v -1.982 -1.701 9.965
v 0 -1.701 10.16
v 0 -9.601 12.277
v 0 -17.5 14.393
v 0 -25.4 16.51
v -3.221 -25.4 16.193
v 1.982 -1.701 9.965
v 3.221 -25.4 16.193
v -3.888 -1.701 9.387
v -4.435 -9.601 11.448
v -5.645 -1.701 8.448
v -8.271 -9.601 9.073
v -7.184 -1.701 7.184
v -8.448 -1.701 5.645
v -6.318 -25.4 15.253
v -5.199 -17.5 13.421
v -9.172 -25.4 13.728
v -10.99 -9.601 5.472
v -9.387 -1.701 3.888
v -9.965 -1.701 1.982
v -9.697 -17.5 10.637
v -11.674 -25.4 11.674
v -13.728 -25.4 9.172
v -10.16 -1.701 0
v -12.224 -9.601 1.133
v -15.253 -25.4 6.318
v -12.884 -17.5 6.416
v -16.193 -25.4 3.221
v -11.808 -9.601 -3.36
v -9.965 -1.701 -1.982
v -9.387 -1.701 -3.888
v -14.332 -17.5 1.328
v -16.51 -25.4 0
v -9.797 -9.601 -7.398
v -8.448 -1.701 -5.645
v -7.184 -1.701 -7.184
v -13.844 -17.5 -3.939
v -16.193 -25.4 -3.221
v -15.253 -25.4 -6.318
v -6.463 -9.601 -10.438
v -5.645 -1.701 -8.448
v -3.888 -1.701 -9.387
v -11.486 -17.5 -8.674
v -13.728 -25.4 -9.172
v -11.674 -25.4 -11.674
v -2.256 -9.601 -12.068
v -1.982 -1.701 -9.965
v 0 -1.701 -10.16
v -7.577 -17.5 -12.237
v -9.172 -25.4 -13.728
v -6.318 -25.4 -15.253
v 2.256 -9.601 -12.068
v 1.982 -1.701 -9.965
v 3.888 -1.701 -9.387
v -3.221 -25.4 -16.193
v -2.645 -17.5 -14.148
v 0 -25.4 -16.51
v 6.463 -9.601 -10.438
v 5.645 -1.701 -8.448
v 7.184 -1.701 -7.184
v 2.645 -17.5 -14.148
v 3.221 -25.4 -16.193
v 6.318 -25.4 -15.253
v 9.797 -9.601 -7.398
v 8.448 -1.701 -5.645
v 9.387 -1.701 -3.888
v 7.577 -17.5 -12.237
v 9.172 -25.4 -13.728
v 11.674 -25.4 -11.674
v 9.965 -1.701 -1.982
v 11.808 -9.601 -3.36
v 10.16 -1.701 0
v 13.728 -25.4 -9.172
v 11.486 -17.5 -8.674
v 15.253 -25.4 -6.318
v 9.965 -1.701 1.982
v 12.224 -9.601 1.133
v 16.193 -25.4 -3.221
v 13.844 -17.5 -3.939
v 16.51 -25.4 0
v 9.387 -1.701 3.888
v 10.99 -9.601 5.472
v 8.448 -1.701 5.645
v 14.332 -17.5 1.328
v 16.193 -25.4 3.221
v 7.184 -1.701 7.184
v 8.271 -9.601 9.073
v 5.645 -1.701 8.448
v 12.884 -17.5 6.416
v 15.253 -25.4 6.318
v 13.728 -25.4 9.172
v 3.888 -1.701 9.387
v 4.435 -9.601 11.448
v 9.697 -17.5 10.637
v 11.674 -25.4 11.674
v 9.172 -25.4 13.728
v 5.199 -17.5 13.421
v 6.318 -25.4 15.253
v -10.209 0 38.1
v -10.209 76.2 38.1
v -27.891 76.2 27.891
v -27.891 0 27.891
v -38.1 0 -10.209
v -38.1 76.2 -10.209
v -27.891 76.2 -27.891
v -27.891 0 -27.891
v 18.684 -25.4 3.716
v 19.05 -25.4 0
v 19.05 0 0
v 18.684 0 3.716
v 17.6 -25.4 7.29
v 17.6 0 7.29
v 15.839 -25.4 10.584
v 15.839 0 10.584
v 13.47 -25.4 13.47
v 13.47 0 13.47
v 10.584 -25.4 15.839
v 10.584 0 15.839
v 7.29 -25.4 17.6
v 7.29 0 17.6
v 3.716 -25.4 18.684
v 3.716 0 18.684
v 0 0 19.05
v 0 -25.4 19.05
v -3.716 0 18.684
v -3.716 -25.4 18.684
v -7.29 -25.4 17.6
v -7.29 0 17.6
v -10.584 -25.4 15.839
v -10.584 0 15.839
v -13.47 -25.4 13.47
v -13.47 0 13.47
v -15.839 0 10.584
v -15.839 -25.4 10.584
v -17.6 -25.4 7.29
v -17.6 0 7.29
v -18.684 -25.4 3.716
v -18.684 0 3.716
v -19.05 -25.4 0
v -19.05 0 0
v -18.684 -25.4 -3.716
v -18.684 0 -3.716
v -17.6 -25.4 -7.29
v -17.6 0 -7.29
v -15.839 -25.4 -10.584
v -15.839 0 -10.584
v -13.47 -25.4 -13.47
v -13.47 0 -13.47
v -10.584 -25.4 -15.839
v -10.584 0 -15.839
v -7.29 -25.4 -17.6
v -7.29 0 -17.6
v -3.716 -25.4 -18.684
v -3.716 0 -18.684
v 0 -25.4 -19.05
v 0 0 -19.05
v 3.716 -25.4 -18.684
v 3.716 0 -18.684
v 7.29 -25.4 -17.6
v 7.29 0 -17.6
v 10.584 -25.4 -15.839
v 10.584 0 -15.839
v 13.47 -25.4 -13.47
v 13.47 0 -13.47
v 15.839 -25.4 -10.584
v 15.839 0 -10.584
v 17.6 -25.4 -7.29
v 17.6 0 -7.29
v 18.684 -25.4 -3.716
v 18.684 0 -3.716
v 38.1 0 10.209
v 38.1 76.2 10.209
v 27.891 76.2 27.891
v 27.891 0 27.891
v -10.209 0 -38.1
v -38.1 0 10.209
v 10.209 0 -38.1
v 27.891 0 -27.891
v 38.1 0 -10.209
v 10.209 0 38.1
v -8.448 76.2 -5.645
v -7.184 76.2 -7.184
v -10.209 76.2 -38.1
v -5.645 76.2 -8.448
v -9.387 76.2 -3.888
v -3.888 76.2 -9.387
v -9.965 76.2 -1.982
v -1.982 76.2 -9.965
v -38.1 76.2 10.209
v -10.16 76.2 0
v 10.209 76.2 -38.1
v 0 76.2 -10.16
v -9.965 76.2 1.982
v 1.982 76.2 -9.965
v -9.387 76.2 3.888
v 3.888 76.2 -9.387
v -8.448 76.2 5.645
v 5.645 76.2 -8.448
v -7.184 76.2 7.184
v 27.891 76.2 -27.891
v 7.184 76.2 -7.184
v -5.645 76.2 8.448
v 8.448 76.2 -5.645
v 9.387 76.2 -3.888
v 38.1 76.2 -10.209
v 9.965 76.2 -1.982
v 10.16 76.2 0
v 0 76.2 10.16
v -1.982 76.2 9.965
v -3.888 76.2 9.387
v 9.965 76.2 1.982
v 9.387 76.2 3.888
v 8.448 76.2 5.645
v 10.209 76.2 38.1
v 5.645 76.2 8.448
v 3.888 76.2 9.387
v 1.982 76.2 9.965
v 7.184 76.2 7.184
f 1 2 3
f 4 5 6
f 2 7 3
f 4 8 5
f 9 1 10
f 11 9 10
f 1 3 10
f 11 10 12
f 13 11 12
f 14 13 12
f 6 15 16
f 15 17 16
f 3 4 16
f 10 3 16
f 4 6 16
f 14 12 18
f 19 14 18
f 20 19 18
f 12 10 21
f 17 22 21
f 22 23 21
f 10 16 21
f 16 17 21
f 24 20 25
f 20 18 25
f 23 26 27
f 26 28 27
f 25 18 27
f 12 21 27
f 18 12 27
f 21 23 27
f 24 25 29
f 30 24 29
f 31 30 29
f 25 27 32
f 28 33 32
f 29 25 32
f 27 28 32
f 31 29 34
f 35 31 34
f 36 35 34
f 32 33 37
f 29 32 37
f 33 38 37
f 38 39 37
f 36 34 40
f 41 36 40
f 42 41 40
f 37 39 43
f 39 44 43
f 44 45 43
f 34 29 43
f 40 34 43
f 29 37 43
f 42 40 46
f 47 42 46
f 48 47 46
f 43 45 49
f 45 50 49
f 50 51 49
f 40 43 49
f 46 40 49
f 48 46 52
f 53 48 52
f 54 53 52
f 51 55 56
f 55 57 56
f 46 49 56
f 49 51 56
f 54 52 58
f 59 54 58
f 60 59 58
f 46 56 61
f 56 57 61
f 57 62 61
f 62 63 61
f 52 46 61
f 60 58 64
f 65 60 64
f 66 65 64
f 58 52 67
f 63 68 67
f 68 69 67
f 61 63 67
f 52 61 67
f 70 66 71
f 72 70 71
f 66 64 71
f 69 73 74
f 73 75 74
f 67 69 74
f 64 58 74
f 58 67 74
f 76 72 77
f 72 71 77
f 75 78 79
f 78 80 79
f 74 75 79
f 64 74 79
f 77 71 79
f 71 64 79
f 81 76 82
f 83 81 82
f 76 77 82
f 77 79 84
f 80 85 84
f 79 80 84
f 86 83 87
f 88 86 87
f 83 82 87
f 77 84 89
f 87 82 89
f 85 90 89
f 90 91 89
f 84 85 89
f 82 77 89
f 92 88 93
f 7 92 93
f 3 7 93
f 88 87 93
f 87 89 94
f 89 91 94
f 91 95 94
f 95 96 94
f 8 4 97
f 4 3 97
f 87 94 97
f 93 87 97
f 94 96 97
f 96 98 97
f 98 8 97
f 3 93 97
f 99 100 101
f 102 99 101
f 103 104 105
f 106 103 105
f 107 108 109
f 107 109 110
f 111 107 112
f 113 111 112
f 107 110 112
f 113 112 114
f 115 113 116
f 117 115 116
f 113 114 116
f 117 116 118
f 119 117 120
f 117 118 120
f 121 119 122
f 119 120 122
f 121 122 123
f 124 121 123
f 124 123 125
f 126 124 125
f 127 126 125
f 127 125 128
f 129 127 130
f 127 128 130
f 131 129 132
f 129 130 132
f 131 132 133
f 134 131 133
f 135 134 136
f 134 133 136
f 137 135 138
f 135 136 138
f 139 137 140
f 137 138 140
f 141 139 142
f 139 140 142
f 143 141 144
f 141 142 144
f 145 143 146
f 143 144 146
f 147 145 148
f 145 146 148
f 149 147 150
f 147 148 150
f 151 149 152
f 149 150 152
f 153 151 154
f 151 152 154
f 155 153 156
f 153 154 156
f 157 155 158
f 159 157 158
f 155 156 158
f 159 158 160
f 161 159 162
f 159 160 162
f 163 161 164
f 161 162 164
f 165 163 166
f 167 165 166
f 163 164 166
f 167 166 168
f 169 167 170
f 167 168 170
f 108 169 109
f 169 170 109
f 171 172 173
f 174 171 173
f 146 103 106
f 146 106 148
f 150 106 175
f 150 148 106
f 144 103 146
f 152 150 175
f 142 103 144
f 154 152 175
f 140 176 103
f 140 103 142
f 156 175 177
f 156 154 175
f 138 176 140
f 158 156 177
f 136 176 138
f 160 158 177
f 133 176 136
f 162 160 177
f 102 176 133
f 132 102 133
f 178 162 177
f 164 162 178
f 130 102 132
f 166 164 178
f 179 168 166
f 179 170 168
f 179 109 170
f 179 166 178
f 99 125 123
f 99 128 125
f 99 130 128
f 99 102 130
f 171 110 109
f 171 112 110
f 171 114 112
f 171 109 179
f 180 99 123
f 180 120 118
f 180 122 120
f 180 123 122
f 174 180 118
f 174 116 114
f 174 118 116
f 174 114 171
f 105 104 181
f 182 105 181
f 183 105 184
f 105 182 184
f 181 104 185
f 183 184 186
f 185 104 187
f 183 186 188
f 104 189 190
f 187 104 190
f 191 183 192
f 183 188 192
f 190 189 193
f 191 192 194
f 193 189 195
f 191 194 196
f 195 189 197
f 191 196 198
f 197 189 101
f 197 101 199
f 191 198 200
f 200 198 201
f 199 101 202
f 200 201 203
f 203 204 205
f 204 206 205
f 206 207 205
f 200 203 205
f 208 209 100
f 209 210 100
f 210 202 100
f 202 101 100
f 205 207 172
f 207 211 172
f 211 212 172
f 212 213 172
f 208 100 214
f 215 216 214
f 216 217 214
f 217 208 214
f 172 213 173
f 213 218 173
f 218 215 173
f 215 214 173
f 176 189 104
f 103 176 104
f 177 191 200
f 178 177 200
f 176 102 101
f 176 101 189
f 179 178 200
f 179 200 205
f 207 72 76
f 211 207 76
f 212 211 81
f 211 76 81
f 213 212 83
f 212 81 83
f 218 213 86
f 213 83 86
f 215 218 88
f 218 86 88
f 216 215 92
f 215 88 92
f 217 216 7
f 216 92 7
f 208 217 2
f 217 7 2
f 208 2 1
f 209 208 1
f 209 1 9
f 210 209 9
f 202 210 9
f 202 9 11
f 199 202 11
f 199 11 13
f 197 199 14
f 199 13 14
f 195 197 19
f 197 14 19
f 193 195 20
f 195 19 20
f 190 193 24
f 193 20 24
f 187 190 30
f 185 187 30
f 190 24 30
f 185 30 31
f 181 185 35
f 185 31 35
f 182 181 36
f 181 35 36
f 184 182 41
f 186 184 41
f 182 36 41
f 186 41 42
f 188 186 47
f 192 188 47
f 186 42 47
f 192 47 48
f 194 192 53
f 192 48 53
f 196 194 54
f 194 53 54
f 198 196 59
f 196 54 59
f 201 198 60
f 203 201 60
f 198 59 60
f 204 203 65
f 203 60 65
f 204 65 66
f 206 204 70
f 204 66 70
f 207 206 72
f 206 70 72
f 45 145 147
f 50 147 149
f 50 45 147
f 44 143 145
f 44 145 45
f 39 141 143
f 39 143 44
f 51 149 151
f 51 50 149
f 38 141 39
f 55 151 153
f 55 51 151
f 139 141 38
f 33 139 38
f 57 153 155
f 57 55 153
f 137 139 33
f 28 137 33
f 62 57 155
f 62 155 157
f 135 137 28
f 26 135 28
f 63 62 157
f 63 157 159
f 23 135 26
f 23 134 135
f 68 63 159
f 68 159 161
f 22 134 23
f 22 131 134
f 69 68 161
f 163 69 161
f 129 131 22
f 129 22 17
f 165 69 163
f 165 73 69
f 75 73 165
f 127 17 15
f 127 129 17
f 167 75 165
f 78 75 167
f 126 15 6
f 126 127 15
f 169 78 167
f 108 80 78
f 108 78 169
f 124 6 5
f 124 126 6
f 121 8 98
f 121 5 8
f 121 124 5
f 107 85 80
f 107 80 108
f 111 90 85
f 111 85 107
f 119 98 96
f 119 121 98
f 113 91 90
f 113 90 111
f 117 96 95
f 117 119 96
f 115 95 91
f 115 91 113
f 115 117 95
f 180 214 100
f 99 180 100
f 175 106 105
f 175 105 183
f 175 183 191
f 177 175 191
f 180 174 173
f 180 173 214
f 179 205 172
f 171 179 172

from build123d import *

# Parameters (mm, degrees)
F1_DEPTH = 76.2
F2_R     = 19.05
F3_DEPTH = 25.4
F4_R     = 10.16
F5_DEPTH = 101.6


with BuildPart() as f1:
    # F0 (on Front) → F1 (new body)
    with BuildSketch(Plane.XZ):
        Polygon((-38.1, 10.208864), (-38.1, -10.208864), (-27.891136, -27.891136), (-10.208864, -38.1), (10.208864, -38.1), (27.891136, -27.891136), (38.1, -10.208864), (38.1, 10.208864), (27.891136, 27.891136), (10.208864, 38.1), (-10.208864, 38.1), (-27.891136, 27.891136), align=None)
    extrude(amount=-F1_DEPTH)

    # F2 (on Front) → F3 (join)
    with BuildSketch(Plane.XZ):
        Circle(F2_R)
    extrude(amount=F3_DEPTH)

    # F4 (on face) → F5 (cut)
    with BuildSketch(Plane.XZ.offset(25.4)):
        Circle(F4_R)
    extrude(amount=-F5_DEPTH, mode=Mode.SUBTRACT)

    # F6 (on Right) → F7 (revolve, cut)
    with BuildSketch(Plane.YZ):
        Polygon((-25.4, 16.51), (-25.4, 0), (36.216159, 0), align=None)
    revolve(axis=Axis((0, 5.408079, 0), (0, -1, 0)), mode=Mode.SUBTRACT)


solid = f1.part
